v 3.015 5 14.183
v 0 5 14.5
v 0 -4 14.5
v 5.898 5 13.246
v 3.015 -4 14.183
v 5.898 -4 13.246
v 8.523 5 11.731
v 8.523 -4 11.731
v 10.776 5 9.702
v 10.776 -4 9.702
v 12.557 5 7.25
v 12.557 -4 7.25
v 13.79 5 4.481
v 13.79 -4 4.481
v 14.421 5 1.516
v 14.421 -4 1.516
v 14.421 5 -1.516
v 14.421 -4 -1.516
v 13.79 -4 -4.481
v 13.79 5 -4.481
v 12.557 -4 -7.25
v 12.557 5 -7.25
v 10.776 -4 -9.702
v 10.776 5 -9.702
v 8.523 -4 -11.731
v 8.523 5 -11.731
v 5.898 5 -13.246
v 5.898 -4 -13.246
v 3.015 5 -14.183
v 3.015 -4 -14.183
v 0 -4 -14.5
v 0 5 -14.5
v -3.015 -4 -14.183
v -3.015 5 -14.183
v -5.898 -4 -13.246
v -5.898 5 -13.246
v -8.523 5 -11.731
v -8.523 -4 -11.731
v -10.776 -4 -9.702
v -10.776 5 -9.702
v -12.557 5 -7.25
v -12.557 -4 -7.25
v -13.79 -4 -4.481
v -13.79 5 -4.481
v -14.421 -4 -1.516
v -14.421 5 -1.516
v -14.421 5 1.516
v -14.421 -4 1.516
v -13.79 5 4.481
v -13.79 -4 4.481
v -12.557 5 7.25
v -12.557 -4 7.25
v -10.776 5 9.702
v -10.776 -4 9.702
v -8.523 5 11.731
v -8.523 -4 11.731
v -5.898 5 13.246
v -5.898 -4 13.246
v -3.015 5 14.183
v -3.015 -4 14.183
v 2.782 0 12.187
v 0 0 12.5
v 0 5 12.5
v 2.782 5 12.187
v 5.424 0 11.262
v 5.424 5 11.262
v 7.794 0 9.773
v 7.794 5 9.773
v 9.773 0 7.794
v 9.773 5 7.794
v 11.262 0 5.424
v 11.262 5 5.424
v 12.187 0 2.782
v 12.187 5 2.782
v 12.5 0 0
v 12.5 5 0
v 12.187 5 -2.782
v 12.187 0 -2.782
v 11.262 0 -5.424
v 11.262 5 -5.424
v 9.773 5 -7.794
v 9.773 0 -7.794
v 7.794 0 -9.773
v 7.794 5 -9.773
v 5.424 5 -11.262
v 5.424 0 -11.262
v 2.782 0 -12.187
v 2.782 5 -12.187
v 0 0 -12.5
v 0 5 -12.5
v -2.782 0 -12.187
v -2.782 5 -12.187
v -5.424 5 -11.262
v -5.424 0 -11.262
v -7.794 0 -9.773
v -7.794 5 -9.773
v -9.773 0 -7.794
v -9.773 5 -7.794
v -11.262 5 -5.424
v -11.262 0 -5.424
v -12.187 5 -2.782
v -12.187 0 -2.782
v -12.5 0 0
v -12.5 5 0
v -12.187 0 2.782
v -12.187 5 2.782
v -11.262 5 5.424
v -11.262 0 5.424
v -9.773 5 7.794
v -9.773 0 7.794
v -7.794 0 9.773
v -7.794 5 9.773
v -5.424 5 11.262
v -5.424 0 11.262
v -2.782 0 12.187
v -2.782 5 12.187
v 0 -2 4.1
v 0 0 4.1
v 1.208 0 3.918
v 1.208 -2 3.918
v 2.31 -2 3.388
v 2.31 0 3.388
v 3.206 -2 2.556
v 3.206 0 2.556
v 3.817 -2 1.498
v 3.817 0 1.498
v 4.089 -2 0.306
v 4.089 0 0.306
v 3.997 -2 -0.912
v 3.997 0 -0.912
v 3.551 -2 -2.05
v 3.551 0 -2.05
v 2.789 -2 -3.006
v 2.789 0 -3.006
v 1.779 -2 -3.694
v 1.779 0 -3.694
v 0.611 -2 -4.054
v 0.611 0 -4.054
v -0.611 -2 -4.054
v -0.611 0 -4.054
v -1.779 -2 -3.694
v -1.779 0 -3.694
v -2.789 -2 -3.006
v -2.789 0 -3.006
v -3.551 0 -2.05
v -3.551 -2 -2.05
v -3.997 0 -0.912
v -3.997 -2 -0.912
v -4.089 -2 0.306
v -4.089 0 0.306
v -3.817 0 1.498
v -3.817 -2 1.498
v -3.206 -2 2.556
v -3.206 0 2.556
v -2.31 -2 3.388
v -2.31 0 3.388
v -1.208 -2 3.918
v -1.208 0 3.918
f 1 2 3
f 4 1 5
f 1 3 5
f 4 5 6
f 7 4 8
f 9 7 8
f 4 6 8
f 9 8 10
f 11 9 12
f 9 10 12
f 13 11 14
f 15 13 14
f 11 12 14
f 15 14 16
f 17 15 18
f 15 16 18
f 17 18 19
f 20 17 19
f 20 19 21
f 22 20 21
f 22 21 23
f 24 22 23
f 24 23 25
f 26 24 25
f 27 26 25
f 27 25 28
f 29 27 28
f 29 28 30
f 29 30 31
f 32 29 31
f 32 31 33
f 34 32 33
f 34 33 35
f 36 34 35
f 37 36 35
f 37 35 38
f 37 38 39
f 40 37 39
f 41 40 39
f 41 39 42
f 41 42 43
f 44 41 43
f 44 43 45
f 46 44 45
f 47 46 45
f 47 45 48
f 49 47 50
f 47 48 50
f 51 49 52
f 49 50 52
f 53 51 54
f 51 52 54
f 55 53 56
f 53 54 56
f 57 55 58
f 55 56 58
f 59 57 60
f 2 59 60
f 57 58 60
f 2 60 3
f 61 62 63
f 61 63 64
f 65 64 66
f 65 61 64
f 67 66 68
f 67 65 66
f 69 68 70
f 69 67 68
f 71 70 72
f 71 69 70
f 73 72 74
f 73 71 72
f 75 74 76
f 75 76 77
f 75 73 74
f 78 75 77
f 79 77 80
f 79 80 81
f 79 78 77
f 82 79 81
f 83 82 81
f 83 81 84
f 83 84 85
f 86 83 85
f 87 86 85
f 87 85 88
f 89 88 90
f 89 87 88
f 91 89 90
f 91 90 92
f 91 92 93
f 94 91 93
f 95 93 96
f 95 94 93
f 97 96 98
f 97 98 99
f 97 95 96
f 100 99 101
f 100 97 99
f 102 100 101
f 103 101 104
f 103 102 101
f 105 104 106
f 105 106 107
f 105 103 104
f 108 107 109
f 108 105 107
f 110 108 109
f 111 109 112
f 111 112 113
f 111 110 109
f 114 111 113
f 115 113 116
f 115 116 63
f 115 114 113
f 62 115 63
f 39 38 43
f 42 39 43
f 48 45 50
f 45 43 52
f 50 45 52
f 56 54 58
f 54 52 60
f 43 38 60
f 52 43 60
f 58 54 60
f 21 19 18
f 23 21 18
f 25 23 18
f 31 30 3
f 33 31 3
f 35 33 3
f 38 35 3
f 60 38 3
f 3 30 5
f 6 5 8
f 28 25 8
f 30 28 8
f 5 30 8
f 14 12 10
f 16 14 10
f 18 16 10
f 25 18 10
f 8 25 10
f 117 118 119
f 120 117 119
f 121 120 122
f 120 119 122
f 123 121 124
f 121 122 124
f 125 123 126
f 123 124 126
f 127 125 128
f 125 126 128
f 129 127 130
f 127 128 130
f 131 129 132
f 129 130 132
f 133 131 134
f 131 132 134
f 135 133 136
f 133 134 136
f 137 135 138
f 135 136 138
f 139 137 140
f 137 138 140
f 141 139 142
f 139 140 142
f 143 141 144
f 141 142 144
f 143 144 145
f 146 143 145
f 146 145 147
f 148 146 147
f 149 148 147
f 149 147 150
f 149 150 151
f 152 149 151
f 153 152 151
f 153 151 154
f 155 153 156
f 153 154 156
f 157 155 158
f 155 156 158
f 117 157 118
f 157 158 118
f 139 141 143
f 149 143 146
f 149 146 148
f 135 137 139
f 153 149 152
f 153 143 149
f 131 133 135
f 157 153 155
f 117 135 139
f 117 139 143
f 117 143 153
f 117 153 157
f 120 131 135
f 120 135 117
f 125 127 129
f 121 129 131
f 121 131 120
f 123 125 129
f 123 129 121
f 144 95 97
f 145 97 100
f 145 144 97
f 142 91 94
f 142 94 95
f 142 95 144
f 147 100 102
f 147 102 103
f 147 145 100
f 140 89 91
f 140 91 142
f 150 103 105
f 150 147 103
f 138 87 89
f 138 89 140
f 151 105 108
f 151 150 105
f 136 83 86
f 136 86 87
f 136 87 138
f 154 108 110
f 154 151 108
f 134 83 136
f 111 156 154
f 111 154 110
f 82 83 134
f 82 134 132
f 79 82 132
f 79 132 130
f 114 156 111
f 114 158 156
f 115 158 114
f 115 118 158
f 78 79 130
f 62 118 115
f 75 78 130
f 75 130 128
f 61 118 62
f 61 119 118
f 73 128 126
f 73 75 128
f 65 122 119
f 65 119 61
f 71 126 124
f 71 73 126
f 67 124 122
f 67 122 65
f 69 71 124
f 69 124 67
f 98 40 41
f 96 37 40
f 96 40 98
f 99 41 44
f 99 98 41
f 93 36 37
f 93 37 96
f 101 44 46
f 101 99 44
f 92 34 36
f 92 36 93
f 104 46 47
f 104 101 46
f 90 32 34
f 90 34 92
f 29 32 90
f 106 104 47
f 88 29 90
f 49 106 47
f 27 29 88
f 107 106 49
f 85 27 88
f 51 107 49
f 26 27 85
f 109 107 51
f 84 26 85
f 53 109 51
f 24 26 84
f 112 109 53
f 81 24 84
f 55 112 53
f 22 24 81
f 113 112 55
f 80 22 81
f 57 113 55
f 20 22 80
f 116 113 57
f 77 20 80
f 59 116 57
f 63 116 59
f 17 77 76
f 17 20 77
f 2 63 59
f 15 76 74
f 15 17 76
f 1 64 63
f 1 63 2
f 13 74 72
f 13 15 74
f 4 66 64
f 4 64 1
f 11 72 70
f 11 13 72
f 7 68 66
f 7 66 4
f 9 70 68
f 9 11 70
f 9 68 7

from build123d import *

# Parameters (mm, degrees)
SKETCH2_R           = 14.5
SKETCH2_R_2         = 12.5
BOSS_EXTRUDE1_DEPTH = 5
BOSS_EXTRUDE2_START = -4
SKETCH2_3_R         = 14.5
BOSS_EXTRUDE2_DEPTH = 4
SKETCH3_R           = 4.1
CUT_EXTRUDE1_DEPTH  = 2


with BuildPart() as part:
    # Sketch2 → Boss-Extrude1 (new body)
    with BuildSketch(Plane(origin=(0, 0, 0), x_dir=(1, 0, 0), z_dir=(0, 1, 0))):
        Circle(SKETCH2_R)
        Circle(SKETCH2_R_2, mode=Mode.SUBTRACT)
    extrude(amount=BOSS_EXTRUDE1_DEPTH)

    # Sketch2<3> → Boss-Extrude2 (add)
    with BuildSketch(Plane(origin=(0, 0, 0), x_dir=(1, 0, 0), z_dir=(0, 1, 0)).offset(BOSS_EXTRUDE2_START)):
        Circle(SKETCH2_3_R)
    extrude(amount=BOSS_EXTRUDE2_DEPTH)

    # Sketch3 → Cut-Extrude1 (cut)
    with BuildSketch(Plane(origin=(0, 0, 0), x_dir=(1, 0, 0), z_dir=(0, 1, 0))):
        Circle(SKETCH3_R)
    extrude(amount=-CUT_EXTRUDE1_DEPTH, mode=Mode.SUBTRACT)


solid = part.part
